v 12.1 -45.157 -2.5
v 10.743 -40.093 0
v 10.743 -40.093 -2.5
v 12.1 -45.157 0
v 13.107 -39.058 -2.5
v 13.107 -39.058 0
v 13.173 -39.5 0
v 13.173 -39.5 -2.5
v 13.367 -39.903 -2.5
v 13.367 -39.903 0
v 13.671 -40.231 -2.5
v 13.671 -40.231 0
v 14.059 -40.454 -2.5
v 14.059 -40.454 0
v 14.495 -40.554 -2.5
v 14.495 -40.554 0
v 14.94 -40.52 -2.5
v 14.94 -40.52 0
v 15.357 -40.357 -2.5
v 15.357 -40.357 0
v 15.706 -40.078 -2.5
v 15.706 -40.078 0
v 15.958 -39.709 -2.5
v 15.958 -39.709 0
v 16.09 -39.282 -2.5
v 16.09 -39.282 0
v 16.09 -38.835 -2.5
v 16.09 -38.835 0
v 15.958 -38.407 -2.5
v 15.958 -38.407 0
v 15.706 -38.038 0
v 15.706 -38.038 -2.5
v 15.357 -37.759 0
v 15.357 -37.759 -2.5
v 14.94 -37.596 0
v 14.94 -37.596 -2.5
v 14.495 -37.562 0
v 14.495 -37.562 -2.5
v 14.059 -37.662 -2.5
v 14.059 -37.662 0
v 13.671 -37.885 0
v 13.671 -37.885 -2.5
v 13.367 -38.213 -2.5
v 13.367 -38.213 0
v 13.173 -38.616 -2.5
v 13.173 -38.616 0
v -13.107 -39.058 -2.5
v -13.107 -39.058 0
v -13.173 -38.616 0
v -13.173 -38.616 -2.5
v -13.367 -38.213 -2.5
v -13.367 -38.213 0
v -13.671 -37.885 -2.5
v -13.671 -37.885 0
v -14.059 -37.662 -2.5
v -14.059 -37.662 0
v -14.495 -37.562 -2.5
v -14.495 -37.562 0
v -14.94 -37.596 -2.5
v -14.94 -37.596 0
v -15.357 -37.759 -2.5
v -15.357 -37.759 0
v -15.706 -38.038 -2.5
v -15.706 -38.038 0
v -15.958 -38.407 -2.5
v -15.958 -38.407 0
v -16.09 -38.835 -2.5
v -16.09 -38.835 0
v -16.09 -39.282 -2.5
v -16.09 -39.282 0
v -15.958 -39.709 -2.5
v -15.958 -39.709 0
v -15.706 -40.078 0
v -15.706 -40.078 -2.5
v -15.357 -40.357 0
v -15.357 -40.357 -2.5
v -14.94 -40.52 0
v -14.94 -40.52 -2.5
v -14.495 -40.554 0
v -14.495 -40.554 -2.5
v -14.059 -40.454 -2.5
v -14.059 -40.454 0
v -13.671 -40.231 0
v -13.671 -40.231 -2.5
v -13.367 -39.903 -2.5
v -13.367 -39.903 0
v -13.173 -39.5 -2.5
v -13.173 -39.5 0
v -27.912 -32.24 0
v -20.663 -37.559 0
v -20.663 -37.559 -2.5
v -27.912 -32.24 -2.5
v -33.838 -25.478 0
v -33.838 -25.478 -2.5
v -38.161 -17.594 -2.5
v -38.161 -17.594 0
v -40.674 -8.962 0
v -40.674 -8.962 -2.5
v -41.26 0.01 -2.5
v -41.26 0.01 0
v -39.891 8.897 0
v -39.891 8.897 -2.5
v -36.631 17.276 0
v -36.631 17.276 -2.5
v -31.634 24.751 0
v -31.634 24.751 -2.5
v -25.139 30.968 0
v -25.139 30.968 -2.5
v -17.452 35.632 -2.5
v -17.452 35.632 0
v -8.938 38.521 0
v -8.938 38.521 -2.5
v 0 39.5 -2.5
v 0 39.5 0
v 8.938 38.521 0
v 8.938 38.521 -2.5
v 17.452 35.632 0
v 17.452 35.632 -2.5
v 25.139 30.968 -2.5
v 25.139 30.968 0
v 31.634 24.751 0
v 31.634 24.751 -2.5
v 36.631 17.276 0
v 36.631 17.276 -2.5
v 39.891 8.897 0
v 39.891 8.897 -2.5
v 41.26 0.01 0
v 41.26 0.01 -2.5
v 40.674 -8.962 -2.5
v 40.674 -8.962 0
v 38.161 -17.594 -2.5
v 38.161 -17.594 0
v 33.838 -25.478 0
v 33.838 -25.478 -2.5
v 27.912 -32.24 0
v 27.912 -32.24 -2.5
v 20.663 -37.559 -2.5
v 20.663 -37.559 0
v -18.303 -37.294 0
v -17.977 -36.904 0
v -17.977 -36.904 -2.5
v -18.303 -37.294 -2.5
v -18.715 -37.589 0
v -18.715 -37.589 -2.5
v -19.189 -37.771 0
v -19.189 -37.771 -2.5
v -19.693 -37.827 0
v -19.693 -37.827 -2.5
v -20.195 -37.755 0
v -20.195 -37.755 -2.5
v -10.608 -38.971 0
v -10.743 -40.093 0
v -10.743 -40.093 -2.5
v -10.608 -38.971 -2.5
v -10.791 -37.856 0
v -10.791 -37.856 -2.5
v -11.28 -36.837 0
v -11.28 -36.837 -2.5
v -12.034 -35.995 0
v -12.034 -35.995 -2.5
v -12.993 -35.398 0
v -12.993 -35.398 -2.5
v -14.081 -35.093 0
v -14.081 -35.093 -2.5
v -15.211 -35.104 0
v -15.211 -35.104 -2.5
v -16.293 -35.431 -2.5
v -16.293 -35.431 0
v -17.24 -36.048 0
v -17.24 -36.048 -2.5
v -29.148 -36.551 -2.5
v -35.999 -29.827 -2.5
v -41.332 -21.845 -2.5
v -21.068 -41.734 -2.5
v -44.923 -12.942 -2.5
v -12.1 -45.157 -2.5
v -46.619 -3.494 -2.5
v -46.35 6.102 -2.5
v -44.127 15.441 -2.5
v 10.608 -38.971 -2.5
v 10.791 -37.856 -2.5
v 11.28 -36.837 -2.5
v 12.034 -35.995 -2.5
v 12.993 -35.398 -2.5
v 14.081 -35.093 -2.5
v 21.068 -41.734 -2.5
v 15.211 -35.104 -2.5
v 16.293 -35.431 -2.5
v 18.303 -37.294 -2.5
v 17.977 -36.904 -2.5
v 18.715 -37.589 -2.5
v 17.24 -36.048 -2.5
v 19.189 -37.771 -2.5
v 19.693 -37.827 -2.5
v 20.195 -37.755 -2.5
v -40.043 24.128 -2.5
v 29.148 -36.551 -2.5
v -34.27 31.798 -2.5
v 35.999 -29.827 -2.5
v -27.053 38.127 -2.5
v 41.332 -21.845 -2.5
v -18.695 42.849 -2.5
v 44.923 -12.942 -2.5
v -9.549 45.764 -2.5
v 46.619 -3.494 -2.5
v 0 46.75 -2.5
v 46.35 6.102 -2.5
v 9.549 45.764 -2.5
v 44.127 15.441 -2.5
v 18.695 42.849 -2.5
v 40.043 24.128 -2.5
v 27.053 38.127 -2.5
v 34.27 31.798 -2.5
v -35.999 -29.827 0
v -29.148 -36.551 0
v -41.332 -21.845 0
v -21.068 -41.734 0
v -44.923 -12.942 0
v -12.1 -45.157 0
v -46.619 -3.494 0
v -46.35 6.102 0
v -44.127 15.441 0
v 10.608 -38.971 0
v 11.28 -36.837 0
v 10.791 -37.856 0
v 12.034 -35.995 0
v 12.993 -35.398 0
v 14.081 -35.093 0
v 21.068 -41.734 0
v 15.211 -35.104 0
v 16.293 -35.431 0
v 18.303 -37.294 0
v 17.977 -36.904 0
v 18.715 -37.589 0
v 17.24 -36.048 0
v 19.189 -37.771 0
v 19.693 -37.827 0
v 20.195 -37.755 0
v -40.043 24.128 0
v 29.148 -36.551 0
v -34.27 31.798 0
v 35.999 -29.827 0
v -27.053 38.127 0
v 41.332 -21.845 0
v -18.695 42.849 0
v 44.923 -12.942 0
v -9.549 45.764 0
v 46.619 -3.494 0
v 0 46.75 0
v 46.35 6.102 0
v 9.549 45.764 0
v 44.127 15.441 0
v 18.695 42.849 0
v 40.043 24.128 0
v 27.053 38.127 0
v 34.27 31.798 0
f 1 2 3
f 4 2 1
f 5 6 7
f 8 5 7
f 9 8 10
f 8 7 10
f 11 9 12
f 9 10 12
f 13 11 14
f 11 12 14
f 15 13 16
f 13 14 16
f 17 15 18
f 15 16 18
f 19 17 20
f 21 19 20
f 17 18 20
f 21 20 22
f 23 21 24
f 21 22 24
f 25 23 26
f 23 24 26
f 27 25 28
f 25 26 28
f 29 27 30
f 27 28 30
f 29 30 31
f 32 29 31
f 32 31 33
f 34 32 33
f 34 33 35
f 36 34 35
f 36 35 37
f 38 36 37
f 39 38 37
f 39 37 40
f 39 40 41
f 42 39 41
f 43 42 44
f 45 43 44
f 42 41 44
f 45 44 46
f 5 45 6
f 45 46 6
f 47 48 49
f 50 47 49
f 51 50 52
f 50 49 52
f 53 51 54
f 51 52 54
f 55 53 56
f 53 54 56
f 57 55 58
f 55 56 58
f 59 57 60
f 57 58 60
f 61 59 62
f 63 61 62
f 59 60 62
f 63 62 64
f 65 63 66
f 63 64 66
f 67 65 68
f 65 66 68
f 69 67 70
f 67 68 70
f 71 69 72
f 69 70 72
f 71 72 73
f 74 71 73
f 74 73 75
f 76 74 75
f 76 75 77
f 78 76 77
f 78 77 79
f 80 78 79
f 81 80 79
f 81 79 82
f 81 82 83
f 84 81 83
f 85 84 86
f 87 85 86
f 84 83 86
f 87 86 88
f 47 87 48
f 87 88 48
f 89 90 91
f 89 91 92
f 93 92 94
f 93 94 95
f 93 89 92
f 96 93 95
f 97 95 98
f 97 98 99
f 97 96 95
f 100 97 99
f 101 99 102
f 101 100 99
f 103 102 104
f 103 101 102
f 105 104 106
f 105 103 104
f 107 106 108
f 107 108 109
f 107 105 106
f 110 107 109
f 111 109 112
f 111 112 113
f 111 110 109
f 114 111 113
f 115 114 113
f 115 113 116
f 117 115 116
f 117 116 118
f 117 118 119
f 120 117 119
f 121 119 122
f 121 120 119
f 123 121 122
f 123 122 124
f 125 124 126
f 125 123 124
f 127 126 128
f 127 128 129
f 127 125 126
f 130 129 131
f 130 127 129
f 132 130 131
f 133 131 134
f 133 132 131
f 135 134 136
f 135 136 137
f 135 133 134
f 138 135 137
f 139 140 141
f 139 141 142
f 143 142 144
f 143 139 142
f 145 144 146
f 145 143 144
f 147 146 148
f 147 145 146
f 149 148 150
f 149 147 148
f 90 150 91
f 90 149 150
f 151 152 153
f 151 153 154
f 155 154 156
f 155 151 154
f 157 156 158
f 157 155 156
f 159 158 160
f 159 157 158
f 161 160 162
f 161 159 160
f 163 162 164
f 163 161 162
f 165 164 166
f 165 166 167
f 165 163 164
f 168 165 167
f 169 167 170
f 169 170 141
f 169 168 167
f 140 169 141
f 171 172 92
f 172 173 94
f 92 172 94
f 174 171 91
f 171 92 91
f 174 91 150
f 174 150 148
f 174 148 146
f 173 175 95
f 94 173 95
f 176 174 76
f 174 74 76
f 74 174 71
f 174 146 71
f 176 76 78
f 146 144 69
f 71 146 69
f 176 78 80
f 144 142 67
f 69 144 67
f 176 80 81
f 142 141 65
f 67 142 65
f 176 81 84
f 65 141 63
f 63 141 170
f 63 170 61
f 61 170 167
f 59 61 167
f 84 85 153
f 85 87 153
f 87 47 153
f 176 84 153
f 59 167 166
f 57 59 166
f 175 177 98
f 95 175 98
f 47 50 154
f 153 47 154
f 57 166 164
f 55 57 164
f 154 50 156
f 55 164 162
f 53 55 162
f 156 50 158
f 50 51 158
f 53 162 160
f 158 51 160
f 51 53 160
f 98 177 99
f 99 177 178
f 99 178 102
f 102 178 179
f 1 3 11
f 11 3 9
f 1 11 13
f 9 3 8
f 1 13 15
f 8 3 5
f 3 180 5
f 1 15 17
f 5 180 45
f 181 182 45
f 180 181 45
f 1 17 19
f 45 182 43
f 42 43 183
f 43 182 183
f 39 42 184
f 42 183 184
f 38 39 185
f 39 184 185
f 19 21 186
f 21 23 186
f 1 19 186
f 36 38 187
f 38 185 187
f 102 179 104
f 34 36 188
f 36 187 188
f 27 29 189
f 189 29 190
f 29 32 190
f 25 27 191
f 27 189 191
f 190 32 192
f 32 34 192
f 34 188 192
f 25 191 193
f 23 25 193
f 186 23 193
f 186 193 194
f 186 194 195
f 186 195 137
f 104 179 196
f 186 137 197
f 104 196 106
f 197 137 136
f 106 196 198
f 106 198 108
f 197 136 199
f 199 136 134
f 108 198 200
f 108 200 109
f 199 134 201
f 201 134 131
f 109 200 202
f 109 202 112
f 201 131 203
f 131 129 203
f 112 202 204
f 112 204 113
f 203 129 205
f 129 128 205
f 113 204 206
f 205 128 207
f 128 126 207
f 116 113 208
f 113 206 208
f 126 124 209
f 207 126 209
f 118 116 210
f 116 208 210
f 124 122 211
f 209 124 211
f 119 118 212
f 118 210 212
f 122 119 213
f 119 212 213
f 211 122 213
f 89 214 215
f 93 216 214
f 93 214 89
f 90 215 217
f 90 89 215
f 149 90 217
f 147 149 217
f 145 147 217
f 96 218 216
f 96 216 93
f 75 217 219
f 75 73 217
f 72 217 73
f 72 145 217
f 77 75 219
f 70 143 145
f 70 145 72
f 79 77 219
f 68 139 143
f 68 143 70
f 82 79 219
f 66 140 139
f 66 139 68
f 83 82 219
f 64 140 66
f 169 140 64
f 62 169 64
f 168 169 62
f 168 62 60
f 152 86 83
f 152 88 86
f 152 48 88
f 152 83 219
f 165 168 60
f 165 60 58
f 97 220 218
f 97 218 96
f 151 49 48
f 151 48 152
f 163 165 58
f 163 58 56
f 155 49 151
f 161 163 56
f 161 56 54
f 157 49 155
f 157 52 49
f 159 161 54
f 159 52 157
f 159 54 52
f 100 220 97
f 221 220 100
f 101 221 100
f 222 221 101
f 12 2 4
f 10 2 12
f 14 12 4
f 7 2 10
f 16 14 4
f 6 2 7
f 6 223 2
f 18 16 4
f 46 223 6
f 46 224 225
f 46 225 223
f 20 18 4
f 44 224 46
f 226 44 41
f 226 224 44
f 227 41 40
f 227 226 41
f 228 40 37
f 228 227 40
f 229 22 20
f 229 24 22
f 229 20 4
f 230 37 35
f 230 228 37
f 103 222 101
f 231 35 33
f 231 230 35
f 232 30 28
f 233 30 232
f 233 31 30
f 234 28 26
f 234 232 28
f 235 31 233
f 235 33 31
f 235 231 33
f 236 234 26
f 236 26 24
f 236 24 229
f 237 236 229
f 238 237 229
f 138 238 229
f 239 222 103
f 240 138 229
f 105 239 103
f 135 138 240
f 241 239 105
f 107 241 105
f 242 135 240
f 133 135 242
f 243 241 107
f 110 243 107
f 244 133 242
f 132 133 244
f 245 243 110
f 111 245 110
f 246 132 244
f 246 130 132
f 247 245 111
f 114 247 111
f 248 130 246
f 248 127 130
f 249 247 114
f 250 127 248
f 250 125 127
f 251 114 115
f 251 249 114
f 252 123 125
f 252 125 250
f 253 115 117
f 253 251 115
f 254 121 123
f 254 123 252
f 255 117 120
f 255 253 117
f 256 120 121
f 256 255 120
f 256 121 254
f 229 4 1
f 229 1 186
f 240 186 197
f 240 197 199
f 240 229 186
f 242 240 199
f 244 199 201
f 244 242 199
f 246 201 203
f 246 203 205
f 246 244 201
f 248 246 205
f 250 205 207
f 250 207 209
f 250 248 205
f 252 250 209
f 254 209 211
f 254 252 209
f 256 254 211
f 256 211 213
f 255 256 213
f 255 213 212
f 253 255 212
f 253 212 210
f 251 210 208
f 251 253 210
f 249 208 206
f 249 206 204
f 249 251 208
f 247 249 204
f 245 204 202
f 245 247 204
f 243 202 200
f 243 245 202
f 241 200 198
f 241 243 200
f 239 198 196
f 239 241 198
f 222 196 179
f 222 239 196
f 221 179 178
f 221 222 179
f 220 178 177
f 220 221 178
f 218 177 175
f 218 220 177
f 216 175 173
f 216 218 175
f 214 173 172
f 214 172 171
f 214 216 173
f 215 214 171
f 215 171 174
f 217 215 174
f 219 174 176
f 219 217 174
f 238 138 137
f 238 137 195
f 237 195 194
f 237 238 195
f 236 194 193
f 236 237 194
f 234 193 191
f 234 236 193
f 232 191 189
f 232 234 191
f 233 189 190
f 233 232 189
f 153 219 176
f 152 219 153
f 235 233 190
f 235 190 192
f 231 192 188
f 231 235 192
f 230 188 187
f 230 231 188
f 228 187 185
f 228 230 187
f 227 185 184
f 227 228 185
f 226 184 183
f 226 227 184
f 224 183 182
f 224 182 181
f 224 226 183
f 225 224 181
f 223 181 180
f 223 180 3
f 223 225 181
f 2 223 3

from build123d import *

# Parameters (mm, degrees)
SKETCH1_R  = 1.5
BODY_DEPTH = 2.5


with BuildPart() as part:
    # Sketch1 → Body (new body)
    with BuildSketch(Plane.XY):
        with BuildLine():
            Line((10.7429859, -40.093369202), (12.099790359, -45.157032379))
            ThreePointArc((12.099790359, -45.157032379), (0, 46.75), (-12.099790359, -45.157032379))
            Line((-12.099790359, -45.157032379), (-10.7429859, -40.093369202))
            ThreePointArc((-10.7429859, -40.093369202), (-12.9932333, -35.397934549), (-17.977352649, -36.904345602))
            ThreePointArc((-17.977352649, -36.904345602), (-19.18898515, -37.770564542), (-20.663329885, -37.559149851))
            ThreePointArc((-20.663329885, -37.559149851), (0, 39.5), (20.663329885, -37.559149851))
            ThreePointArc((20.663329885, -37.559149851), (19.18898515, -37.770564542), (17.977352649, -36.904345602))
            ThreePointArc((17.977352649, -36.904345602), (12.9932333, -35.397934549), (10.7429859, -40.093369202))
        make_face()
        with Locations(Location((14.606689205, -39.058093022, 0), (0, 0, 180))):
            Circle(SKETCH1_R, mode=Mode.SUBTRACT)
        with Locations((-14.606689205, -39.058093022)):
            Circle(SKETCH1_R, mode=Mode.SUBTRACT)
    extrude(amount=-BODY_DEPTH)


solid = part.part
